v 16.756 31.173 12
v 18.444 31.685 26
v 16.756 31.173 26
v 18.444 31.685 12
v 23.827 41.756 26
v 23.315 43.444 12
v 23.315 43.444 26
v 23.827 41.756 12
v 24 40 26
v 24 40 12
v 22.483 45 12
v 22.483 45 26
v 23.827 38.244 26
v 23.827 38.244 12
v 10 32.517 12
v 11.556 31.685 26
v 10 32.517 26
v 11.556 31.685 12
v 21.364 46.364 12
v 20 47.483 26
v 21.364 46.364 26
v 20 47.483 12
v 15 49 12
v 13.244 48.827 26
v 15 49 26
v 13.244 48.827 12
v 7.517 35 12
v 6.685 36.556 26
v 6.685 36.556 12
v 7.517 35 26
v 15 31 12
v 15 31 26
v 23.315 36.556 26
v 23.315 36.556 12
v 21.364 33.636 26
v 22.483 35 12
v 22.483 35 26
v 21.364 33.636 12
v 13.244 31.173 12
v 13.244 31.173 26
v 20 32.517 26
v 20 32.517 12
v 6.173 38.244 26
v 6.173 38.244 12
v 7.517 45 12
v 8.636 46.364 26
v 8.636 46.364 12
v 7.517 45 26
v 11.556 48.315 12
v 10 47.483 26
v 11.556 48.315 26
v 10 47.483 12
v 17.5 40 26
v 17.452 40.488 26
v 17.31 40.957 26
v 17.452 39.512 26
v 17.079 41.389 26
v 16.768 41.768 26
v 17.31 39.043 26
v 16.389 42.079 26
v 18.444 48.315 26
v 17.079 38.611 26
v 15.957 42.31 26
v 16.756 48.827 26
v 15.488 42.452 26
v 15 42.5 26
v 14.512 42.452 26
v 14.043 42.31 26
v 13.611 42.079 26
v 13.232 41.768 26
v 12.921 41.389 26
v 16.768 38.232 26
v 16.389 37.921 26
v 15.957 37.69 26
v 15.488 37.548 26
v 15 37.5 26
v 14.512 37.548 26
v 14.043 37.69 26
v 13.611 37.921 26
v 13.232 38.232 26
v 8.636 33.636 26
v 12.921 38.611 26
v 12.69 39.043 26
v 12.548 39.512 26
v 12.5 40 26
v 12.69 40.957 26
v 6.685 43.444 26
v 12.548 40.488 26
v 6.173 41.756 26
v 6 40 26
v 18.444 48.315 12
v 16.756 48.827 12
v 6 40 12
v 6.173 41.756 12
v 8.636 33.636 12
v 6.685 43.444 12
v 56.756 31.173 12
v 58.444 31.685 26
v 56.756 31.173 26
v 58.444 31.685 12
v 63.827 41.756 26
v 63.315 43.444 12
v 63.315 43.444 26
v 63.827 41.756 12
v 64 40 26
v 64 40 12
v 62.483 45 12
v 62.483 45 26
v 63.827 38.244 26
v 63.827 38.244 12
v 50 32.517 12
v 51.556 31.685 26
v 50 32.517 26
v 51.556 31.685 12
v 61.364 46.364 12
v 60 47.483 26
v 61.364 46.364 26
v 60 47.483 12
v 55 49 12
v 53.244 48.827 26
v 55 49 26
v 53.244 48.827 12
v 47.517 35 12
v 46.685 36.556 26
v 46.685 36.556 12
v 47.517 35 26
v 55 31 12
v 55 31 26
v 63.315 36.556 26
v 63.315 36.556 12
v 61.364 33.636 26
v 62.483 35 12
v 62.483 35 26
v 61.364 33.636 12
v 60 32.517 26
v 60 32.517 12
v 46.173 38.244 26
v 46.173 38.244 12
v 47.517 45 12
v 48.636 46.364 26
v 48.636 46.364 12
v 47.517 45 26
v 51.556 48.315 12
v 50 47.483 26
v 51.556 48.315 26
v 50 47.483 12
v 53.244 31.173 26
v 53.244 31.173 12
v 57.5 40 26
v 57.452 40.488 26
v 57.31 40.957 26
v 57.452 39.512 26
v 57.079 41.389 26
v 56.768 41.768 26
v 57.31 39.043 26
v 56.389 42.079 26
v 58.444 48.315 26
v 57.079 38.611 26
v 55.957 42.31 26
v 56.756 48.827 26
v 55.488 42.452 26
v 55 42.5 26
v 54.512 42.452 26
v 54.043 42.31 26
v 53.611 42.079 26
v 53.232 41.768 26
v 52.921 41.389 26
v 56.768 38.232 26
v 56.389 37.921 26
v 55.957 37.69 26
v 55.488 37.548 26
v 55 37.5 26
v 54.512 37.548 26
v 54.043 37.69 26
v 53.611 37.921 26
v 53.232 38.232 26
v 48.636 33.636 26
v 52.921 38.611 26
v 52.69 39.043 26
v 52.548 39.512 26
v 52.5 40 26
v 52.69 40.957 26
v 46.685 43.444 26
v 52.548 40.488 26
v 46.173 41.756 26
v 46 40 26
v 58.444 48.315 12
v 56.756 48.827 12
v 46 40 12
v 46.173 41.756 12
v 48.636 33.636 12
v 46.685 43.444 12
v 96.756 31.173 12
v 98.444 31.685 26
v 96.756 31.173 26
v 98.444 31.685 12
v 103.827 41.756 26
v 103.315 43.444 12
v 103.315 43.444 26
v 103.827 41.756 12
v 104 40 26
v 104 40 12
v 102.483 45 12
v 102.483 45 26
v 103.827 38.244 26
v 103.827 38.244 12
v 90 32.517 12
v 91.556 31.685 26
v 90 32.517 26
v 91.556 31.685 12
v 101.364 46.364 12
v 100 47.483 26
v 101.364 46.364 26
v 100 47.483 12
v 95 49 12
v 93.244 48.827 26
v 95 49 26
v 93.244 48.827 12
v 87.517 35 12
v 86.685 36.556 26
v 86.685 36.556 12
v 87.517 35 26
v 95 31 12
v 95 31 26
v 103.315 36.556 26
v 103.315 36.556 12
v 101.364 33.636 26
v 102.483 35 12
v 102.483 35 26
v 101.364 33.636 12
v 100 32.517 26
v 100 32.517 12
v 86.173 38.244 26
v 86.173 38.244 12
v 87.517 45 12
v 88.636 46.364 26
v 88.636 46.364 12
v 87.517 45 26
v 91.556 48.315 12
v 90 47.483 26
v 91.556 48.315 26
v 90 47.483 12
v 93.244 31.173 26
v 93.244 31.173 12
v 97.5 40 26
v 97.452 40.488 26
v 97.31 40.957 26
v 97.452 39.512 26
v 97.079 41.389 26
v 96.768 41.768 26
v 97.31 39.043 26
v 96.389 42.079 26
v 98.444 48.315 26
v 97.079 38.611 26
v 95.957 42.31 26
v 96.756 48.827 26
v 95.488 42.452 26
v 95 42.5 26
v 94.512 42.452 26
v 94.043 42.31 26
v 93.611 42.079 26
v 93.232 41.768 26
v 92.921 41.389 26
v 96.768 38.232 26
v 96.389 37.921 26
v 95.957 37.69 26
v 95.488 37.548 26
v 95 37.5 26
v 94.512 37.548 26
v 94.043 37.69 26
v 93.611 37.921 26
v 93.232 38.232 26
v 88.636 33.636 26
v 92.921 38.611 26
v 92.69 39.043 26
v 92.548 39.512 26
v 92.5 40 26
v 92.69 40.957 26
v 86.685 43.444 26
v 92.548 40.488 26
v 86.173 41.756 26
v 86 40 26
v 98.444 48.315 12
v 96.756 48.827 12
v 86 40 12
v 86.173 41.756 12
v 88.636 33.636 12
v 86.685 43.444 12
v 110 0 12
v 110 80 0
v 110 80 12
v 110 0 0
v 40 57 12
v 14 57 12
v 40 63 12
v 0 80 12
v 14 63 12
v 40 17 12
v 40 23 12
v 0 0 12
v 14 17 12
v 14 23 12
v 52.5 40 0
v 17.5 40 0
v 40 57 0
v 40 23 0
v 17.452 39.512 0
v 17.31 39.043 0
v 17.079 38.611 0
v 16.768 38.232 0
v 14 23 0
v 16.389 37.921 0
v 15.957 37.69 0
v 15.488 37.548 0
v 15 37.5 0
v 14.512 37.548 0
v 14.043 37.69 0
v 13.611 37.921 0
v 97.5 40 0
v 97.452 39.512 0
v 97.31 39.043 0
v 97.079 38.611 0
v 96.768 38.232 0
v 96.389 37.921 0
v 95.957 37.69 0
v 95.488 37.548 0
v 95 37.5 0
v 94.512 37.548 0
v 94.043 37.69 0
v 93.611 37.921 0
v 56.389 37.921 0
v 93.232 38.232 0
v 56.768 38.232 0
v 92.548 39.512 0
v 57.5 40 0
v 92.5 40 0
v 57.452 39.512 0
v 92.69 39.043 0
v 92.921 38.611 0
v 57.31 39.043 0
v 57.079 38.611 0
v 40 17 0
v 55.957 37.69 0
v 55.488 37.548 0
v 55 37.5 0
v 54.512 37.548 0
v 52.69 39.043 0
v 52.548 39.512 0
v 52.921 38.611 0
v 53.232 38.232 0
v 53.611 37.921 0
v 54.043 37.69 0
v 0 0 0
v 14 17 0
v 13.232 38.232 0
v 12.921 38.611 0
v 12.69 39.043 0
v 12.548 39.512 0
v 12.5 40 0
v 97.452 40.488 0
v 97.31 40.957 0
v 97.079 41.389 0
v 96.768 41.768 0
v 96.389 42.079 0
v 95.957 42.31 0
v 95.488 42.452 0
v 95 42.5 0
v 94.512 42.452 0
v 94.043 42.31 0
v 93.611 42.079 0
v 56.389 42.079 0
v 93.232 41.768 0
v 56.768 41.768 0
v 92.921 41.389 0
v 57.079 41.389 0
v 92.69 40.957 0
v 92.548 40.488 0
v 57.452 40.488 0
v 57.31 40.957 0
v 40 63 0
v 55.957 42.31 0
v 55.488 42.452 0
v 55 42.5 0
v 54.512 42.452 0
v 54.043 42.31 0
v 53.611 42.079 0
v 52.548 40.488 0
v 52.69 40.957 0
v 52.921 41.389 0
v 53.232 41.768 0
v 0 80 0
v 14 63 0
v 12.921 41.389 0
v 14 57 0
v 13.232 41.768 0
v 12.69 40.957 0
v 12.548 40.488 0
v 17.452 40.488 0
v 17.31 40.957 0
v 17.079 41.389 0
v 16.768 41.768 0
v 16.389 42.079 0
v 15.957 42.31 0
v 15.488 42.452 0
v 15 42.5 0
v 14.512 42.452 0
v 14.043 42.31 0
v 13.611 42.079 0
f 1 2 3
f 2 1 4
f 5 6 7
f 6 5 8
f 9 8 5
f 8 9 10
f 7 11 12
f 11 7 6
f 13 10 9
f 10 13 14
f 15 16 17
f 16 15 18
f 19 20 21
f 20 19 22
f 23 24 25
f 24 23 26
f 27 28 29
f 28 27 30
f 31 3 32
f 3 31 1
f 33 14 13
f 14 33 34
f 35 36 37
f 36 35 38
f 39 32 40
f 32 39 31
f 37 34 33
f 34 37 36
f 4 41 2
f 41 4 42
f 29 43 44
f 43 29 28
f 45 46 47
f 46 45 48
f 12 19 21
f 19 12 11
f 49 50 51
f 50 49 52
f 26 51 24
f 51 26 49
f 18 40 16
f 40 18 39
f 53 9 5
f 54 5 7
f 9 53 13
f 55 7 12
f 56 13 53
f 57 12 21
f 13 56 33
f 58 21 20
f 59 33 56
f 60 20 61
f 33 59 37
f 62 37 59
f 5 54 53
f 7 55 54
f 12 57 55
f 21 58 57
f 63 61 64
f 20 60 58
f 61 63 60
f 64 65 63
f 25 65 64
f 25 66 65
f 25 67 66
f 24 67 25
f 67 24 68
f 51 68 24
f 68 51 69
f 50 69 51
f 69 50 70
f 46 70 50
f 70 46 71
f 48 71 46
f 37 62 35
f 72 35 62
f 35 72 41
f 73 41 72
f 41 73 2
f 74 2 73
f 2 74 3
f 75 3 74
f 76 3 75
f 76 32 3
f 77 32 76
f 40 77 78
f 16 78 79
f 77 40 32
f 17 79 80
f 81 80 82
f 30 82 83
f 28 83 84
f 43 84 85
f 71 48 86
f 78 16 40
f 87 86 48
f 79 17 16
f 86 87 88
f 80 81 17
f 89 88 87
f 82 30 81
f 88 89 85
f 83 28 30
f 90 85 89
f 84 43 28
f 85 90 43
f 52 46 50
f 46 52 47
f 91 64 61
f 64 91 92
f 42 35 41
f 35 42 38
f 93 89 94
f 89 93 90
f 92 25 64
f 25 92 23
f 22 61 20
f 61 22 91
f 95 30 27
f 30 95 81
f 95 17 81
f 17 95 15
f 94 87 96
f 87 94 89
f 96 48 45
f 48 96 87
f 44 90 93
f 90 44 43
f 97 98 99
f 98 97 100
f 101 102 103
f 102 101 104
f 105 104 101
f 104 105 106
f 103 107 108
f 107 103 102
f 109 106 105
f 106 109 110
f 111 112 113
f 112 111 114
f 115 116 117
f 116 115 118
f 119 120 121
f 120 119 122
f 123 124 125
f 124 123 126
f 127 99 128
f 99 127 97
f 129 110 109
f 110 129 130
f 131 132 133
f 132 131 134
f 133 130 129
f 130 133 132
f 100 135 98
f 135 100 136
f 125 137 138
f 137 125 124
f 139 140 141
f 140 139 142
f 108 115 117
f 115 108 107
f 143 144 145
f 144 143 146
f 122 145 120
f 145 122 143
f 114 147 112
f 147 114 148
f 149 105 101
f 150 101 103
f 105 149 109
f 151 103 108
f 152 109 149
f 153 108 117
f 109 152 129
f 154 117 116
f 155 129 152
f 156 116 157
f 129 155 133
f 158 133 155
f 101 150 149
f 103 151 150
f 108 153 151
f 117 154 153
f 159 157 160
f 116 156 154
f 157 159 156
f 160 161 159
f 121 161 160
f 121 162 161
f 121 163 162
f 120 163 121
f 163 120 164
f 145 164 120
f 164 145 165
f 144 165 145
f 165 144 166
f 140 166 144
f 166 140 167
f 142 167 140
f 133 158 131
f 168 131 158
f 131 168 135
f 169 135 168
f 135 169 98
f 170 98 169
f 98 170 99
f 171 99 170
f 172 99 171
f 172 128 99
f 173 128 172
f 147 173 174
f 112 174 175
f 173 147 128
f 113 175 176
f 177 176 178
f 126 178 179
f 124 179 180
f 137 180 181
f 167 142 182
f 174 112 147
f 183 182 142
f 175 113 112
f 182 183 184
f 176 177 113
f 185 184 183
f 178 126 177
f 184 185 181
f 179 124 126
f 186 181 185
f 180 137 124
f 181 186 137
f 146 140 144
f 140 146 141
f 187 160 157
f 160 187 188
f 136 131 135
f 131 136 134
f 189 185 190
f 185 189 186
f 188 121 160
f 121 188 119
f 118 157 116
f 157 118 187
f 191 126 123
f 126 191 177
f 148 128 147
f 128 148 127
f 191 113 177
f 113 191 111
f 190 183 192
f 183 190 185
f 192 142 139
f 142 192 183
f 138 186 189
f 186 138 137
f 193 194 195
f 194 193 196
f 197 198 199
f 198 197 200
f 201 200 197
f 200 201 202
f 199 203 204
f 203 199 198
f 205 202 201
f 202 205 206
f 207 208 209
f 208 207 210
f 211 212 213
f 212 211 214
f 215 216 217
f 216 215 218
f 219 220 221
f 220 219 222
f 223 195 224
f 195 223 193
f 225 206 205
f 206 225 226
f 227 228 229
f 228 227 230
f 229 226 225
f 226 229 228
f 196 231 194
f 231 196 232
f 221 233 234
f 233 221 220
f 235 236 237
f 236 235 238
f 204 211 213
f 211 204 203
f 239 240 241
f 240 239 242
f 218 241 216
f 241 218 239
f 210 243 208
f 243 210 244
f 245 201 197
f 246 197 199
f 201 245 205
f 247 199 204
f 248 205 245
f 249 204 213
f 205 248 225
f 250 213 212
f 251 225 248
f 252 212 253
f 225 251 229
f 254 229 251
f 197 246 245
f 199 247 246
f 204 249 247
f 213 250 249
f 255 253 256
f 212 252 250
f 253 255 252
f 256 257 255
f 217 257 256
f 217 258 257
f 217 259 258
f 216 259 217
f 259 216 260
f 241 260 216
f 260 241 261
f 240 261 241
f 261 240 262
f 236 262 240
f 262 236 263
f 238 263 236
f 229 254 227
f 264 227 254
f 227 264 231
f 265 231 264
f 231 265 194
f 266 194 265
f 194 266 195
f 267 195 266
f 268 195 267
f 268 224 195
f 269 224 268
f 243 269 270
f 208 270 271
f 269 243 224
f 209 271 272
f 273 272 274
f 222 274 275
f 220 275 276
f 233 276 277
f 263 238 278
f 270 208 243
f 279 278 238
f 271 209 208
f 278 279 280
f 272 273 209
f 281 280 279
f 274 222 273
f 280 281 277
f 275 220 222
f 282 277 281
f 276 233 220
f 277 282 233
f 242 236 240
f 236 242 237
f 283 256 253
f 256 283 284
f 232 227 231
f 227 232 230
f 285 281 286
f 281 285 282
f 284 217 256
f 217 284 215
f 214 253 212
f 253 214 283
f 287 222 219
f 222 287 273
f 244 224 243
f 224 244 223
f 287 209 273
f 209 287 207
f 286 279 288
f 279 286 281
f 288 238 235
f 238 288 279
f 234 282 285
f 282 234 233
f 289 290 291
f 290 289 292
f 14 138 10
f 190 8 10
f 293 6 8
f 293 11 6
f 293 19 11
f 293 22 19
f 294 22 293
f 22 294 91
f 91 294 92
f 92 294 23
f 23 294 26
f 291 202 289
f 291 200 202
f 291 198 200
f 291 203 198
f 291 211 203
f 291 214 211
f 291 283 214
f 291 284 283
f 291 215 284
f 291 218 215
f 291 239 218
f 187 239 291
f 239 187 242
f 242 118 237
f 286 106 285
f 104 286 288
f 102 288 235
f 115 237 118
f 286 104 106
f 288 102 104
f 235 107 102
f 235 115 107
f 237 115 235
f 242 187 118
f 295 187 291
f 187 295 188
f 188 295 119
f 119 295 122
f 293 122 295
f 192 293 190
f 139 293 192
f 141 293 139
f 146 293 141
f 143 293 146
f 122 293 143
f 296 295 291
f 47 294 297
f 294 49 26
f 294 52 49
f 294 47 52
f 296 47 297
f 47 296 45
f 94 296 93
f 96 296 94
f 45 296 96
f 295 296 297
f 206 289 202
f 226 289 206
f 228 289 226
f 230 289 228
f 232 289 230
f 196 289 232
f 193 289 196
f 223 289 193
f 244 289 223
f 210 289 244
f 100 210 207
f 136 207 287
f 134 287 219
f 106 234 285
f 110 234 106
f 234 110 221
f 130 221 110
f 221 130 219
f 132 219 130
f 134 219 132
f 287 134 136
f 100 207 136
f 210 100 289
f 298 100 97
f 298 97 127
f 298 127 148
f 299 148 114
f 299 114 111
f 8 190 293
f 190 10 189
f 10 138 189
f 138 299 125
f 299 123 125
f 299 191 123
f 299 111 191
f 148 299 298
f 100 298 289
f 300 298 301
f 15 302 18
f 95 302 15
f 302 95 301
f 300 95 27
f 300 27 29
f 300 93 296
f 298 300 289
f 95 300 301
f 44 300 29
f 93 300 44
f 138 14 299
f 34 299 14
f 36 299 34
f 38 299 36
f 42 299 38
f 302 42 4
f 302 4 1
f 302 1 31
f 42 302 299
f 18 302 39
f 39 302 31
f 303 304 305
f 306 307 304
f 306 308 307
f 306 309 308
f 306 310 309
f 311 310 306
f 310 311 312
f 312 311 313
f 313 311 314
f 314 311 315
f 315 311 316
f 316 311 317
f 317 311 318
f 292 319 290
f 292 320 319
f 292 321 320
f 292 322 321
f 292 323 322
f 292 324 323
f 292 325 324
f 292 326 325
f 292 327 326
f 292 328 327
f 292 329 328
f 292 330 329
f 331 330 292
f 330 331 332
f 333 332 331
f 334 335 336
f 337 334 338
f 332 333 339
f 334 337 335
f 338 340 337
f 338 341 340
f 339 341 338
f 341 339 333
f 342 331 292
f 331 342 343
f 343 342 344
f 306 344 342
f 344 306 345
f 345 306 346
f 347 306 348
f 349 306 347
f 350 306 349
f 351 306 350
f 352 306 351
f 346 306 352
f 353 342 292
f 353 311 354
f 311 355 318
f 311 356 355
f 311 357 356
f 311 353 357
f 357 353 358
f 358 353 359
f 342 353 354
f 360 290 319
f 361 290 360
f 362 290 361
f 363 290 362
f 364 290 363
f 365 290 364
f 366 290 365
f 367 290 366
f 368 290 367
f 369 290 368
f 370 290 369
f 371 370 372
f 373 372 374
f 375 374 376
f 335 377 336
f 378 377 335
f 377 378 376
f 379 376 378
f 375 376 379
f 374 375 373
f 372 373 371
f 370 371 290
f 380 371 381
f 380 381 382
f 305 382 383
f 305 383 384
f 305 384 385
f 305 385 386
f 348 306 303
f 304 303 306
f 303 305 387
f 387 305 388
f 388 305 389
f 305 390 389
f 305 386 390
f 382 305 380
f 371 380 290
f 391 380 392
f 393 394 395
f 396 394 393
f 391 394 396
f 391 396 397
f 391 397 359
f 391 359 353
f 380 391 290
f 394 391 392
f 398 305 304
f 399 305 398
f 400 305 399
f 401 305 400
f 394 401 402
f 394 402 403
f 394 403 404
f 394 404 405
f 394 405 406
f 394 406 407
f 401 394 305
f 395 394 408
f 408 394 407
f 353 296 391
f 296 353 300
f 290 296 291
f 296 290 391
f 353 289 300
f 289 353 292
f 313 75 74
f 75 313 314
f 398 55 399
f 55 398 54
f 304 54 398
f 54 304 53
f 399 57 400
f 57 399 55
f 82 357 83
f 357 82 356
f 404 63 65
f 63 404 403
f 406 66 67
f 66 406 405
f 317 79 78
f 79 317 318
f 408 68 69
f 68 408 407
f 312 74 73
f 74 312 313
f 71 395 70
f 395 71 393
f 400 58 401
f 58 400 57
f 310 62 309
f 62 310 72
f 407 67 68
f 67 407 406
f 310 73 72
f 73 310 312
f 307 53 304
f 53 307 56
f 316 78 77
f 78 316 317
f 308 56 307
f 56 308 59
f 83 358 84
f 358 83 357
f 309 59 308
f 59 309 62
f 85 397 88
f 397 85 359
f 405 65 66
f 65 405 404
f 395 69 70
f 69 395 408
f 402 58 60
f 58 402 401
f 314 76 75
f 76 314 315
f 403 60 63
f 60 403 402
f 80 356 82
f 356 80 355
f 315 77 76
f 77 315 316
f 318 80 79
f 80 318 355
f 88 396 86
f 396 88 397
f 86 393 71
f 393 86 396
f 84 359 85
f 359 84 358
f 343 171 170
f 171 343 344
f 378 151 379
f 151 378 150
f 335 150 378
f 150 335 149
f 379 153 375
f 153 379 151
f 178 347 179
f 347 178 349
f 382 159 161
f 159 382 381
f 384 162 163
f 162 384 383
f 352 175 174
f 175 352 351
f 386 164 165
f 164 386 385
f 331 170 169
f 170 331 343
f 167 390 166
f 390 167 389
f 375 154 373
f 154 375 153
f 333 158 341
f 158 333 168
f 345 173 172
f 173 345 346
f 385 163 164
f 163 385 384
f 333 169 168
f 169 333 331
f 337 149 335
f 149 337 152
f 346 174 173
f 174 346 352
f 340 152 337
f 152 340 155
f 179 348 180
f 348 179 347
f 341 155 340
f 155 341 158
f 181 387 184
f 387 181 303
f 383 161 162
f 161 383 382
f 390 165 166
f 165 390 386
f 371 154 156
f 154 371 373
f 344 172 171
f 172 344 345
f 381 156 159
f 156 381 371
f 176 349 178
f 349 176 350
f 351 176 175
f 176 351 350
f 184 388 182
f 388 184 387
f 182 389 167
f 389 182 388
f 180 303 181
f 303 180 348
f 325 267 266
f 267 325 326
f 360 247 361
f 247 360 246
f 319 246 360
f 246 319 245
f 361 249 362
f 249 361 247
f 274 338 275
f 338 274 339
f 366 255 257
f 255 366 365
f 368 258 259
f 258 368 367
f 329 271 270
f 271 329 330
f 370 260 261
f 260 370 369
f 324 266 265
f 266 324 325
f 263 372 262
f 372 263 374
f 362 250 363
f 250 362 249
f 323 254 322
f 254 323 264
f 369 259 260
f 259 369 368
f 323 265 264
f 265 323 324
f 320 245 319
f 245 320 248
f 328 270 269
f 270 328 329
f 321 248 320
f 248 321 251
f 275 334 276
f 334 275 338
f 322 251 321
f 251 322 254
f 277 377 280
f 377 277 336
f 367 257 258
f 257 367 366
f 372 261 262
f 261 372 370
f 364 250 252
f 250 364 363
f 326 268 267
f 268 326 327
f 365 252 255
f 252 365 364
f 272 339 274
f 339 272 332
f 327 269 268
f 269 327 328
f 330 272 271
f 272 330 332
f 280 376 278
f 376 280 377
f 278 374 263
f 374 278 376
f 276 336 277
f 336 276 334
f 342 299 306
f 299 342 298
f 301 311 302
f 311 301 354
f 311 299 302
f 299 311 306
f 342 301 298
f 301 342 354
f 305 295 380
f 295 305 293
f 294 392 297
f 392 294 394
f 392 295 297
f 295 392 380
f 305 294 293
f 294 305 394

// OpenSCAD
$fn = 32;

// ----------------------------------------------------------------------
// Drill jig: three_boss_slot jig
// ----------------------------------------------------------------------

// --- parameters (mm) ---
plate_l = 110;            // plate length, X
plate_w = 80;             // plate width, Y
plate_t = 12;             // plate thickness
boss_d = 18;              // guide boss diameter
boss_h = 15;              // boss height above the plate
guide_d = 5;              // guide hole diameter
boss_pitch = 40;          // boss pitch
slot_w = 6;               // clamp slot width
slot_l = 26;              // clamp slot length
slot_x = 14;              // slot start X

n_boss = 3;  // guide bosses
boss_x0 = (plate_l - (n_boss - 1) * boss_pitch) / 2;  // first boss X
boss_top = plate_t - 1 + boss_h;  // boss crown height
total_h = boss_top;  // overall height

difference() {
  union() {
  cube([plate_l, plate_w, plate_t]);
  for (i = [0 : n_boss - 1])
    translate([boss_x0 + i * boss_pitch, plate_w / 2, plate_t - 1])
      cylinder(h = boss_h, d = boss_d);
  }
  for (i = [0 : n_boss - 1])
    translate([boss_x0 + i * boss_pitch, plate_w / 2, -1])
      cylinder(h = plate_t + boss_h, d = guide_d);
  for (cy = [plate_w * 0.25, plate_w * 0.75])
    translate([slot_x, cy - slot_w / 2, -1])
      cube([slot_l, slot_w, plate_t + 2]);
}
